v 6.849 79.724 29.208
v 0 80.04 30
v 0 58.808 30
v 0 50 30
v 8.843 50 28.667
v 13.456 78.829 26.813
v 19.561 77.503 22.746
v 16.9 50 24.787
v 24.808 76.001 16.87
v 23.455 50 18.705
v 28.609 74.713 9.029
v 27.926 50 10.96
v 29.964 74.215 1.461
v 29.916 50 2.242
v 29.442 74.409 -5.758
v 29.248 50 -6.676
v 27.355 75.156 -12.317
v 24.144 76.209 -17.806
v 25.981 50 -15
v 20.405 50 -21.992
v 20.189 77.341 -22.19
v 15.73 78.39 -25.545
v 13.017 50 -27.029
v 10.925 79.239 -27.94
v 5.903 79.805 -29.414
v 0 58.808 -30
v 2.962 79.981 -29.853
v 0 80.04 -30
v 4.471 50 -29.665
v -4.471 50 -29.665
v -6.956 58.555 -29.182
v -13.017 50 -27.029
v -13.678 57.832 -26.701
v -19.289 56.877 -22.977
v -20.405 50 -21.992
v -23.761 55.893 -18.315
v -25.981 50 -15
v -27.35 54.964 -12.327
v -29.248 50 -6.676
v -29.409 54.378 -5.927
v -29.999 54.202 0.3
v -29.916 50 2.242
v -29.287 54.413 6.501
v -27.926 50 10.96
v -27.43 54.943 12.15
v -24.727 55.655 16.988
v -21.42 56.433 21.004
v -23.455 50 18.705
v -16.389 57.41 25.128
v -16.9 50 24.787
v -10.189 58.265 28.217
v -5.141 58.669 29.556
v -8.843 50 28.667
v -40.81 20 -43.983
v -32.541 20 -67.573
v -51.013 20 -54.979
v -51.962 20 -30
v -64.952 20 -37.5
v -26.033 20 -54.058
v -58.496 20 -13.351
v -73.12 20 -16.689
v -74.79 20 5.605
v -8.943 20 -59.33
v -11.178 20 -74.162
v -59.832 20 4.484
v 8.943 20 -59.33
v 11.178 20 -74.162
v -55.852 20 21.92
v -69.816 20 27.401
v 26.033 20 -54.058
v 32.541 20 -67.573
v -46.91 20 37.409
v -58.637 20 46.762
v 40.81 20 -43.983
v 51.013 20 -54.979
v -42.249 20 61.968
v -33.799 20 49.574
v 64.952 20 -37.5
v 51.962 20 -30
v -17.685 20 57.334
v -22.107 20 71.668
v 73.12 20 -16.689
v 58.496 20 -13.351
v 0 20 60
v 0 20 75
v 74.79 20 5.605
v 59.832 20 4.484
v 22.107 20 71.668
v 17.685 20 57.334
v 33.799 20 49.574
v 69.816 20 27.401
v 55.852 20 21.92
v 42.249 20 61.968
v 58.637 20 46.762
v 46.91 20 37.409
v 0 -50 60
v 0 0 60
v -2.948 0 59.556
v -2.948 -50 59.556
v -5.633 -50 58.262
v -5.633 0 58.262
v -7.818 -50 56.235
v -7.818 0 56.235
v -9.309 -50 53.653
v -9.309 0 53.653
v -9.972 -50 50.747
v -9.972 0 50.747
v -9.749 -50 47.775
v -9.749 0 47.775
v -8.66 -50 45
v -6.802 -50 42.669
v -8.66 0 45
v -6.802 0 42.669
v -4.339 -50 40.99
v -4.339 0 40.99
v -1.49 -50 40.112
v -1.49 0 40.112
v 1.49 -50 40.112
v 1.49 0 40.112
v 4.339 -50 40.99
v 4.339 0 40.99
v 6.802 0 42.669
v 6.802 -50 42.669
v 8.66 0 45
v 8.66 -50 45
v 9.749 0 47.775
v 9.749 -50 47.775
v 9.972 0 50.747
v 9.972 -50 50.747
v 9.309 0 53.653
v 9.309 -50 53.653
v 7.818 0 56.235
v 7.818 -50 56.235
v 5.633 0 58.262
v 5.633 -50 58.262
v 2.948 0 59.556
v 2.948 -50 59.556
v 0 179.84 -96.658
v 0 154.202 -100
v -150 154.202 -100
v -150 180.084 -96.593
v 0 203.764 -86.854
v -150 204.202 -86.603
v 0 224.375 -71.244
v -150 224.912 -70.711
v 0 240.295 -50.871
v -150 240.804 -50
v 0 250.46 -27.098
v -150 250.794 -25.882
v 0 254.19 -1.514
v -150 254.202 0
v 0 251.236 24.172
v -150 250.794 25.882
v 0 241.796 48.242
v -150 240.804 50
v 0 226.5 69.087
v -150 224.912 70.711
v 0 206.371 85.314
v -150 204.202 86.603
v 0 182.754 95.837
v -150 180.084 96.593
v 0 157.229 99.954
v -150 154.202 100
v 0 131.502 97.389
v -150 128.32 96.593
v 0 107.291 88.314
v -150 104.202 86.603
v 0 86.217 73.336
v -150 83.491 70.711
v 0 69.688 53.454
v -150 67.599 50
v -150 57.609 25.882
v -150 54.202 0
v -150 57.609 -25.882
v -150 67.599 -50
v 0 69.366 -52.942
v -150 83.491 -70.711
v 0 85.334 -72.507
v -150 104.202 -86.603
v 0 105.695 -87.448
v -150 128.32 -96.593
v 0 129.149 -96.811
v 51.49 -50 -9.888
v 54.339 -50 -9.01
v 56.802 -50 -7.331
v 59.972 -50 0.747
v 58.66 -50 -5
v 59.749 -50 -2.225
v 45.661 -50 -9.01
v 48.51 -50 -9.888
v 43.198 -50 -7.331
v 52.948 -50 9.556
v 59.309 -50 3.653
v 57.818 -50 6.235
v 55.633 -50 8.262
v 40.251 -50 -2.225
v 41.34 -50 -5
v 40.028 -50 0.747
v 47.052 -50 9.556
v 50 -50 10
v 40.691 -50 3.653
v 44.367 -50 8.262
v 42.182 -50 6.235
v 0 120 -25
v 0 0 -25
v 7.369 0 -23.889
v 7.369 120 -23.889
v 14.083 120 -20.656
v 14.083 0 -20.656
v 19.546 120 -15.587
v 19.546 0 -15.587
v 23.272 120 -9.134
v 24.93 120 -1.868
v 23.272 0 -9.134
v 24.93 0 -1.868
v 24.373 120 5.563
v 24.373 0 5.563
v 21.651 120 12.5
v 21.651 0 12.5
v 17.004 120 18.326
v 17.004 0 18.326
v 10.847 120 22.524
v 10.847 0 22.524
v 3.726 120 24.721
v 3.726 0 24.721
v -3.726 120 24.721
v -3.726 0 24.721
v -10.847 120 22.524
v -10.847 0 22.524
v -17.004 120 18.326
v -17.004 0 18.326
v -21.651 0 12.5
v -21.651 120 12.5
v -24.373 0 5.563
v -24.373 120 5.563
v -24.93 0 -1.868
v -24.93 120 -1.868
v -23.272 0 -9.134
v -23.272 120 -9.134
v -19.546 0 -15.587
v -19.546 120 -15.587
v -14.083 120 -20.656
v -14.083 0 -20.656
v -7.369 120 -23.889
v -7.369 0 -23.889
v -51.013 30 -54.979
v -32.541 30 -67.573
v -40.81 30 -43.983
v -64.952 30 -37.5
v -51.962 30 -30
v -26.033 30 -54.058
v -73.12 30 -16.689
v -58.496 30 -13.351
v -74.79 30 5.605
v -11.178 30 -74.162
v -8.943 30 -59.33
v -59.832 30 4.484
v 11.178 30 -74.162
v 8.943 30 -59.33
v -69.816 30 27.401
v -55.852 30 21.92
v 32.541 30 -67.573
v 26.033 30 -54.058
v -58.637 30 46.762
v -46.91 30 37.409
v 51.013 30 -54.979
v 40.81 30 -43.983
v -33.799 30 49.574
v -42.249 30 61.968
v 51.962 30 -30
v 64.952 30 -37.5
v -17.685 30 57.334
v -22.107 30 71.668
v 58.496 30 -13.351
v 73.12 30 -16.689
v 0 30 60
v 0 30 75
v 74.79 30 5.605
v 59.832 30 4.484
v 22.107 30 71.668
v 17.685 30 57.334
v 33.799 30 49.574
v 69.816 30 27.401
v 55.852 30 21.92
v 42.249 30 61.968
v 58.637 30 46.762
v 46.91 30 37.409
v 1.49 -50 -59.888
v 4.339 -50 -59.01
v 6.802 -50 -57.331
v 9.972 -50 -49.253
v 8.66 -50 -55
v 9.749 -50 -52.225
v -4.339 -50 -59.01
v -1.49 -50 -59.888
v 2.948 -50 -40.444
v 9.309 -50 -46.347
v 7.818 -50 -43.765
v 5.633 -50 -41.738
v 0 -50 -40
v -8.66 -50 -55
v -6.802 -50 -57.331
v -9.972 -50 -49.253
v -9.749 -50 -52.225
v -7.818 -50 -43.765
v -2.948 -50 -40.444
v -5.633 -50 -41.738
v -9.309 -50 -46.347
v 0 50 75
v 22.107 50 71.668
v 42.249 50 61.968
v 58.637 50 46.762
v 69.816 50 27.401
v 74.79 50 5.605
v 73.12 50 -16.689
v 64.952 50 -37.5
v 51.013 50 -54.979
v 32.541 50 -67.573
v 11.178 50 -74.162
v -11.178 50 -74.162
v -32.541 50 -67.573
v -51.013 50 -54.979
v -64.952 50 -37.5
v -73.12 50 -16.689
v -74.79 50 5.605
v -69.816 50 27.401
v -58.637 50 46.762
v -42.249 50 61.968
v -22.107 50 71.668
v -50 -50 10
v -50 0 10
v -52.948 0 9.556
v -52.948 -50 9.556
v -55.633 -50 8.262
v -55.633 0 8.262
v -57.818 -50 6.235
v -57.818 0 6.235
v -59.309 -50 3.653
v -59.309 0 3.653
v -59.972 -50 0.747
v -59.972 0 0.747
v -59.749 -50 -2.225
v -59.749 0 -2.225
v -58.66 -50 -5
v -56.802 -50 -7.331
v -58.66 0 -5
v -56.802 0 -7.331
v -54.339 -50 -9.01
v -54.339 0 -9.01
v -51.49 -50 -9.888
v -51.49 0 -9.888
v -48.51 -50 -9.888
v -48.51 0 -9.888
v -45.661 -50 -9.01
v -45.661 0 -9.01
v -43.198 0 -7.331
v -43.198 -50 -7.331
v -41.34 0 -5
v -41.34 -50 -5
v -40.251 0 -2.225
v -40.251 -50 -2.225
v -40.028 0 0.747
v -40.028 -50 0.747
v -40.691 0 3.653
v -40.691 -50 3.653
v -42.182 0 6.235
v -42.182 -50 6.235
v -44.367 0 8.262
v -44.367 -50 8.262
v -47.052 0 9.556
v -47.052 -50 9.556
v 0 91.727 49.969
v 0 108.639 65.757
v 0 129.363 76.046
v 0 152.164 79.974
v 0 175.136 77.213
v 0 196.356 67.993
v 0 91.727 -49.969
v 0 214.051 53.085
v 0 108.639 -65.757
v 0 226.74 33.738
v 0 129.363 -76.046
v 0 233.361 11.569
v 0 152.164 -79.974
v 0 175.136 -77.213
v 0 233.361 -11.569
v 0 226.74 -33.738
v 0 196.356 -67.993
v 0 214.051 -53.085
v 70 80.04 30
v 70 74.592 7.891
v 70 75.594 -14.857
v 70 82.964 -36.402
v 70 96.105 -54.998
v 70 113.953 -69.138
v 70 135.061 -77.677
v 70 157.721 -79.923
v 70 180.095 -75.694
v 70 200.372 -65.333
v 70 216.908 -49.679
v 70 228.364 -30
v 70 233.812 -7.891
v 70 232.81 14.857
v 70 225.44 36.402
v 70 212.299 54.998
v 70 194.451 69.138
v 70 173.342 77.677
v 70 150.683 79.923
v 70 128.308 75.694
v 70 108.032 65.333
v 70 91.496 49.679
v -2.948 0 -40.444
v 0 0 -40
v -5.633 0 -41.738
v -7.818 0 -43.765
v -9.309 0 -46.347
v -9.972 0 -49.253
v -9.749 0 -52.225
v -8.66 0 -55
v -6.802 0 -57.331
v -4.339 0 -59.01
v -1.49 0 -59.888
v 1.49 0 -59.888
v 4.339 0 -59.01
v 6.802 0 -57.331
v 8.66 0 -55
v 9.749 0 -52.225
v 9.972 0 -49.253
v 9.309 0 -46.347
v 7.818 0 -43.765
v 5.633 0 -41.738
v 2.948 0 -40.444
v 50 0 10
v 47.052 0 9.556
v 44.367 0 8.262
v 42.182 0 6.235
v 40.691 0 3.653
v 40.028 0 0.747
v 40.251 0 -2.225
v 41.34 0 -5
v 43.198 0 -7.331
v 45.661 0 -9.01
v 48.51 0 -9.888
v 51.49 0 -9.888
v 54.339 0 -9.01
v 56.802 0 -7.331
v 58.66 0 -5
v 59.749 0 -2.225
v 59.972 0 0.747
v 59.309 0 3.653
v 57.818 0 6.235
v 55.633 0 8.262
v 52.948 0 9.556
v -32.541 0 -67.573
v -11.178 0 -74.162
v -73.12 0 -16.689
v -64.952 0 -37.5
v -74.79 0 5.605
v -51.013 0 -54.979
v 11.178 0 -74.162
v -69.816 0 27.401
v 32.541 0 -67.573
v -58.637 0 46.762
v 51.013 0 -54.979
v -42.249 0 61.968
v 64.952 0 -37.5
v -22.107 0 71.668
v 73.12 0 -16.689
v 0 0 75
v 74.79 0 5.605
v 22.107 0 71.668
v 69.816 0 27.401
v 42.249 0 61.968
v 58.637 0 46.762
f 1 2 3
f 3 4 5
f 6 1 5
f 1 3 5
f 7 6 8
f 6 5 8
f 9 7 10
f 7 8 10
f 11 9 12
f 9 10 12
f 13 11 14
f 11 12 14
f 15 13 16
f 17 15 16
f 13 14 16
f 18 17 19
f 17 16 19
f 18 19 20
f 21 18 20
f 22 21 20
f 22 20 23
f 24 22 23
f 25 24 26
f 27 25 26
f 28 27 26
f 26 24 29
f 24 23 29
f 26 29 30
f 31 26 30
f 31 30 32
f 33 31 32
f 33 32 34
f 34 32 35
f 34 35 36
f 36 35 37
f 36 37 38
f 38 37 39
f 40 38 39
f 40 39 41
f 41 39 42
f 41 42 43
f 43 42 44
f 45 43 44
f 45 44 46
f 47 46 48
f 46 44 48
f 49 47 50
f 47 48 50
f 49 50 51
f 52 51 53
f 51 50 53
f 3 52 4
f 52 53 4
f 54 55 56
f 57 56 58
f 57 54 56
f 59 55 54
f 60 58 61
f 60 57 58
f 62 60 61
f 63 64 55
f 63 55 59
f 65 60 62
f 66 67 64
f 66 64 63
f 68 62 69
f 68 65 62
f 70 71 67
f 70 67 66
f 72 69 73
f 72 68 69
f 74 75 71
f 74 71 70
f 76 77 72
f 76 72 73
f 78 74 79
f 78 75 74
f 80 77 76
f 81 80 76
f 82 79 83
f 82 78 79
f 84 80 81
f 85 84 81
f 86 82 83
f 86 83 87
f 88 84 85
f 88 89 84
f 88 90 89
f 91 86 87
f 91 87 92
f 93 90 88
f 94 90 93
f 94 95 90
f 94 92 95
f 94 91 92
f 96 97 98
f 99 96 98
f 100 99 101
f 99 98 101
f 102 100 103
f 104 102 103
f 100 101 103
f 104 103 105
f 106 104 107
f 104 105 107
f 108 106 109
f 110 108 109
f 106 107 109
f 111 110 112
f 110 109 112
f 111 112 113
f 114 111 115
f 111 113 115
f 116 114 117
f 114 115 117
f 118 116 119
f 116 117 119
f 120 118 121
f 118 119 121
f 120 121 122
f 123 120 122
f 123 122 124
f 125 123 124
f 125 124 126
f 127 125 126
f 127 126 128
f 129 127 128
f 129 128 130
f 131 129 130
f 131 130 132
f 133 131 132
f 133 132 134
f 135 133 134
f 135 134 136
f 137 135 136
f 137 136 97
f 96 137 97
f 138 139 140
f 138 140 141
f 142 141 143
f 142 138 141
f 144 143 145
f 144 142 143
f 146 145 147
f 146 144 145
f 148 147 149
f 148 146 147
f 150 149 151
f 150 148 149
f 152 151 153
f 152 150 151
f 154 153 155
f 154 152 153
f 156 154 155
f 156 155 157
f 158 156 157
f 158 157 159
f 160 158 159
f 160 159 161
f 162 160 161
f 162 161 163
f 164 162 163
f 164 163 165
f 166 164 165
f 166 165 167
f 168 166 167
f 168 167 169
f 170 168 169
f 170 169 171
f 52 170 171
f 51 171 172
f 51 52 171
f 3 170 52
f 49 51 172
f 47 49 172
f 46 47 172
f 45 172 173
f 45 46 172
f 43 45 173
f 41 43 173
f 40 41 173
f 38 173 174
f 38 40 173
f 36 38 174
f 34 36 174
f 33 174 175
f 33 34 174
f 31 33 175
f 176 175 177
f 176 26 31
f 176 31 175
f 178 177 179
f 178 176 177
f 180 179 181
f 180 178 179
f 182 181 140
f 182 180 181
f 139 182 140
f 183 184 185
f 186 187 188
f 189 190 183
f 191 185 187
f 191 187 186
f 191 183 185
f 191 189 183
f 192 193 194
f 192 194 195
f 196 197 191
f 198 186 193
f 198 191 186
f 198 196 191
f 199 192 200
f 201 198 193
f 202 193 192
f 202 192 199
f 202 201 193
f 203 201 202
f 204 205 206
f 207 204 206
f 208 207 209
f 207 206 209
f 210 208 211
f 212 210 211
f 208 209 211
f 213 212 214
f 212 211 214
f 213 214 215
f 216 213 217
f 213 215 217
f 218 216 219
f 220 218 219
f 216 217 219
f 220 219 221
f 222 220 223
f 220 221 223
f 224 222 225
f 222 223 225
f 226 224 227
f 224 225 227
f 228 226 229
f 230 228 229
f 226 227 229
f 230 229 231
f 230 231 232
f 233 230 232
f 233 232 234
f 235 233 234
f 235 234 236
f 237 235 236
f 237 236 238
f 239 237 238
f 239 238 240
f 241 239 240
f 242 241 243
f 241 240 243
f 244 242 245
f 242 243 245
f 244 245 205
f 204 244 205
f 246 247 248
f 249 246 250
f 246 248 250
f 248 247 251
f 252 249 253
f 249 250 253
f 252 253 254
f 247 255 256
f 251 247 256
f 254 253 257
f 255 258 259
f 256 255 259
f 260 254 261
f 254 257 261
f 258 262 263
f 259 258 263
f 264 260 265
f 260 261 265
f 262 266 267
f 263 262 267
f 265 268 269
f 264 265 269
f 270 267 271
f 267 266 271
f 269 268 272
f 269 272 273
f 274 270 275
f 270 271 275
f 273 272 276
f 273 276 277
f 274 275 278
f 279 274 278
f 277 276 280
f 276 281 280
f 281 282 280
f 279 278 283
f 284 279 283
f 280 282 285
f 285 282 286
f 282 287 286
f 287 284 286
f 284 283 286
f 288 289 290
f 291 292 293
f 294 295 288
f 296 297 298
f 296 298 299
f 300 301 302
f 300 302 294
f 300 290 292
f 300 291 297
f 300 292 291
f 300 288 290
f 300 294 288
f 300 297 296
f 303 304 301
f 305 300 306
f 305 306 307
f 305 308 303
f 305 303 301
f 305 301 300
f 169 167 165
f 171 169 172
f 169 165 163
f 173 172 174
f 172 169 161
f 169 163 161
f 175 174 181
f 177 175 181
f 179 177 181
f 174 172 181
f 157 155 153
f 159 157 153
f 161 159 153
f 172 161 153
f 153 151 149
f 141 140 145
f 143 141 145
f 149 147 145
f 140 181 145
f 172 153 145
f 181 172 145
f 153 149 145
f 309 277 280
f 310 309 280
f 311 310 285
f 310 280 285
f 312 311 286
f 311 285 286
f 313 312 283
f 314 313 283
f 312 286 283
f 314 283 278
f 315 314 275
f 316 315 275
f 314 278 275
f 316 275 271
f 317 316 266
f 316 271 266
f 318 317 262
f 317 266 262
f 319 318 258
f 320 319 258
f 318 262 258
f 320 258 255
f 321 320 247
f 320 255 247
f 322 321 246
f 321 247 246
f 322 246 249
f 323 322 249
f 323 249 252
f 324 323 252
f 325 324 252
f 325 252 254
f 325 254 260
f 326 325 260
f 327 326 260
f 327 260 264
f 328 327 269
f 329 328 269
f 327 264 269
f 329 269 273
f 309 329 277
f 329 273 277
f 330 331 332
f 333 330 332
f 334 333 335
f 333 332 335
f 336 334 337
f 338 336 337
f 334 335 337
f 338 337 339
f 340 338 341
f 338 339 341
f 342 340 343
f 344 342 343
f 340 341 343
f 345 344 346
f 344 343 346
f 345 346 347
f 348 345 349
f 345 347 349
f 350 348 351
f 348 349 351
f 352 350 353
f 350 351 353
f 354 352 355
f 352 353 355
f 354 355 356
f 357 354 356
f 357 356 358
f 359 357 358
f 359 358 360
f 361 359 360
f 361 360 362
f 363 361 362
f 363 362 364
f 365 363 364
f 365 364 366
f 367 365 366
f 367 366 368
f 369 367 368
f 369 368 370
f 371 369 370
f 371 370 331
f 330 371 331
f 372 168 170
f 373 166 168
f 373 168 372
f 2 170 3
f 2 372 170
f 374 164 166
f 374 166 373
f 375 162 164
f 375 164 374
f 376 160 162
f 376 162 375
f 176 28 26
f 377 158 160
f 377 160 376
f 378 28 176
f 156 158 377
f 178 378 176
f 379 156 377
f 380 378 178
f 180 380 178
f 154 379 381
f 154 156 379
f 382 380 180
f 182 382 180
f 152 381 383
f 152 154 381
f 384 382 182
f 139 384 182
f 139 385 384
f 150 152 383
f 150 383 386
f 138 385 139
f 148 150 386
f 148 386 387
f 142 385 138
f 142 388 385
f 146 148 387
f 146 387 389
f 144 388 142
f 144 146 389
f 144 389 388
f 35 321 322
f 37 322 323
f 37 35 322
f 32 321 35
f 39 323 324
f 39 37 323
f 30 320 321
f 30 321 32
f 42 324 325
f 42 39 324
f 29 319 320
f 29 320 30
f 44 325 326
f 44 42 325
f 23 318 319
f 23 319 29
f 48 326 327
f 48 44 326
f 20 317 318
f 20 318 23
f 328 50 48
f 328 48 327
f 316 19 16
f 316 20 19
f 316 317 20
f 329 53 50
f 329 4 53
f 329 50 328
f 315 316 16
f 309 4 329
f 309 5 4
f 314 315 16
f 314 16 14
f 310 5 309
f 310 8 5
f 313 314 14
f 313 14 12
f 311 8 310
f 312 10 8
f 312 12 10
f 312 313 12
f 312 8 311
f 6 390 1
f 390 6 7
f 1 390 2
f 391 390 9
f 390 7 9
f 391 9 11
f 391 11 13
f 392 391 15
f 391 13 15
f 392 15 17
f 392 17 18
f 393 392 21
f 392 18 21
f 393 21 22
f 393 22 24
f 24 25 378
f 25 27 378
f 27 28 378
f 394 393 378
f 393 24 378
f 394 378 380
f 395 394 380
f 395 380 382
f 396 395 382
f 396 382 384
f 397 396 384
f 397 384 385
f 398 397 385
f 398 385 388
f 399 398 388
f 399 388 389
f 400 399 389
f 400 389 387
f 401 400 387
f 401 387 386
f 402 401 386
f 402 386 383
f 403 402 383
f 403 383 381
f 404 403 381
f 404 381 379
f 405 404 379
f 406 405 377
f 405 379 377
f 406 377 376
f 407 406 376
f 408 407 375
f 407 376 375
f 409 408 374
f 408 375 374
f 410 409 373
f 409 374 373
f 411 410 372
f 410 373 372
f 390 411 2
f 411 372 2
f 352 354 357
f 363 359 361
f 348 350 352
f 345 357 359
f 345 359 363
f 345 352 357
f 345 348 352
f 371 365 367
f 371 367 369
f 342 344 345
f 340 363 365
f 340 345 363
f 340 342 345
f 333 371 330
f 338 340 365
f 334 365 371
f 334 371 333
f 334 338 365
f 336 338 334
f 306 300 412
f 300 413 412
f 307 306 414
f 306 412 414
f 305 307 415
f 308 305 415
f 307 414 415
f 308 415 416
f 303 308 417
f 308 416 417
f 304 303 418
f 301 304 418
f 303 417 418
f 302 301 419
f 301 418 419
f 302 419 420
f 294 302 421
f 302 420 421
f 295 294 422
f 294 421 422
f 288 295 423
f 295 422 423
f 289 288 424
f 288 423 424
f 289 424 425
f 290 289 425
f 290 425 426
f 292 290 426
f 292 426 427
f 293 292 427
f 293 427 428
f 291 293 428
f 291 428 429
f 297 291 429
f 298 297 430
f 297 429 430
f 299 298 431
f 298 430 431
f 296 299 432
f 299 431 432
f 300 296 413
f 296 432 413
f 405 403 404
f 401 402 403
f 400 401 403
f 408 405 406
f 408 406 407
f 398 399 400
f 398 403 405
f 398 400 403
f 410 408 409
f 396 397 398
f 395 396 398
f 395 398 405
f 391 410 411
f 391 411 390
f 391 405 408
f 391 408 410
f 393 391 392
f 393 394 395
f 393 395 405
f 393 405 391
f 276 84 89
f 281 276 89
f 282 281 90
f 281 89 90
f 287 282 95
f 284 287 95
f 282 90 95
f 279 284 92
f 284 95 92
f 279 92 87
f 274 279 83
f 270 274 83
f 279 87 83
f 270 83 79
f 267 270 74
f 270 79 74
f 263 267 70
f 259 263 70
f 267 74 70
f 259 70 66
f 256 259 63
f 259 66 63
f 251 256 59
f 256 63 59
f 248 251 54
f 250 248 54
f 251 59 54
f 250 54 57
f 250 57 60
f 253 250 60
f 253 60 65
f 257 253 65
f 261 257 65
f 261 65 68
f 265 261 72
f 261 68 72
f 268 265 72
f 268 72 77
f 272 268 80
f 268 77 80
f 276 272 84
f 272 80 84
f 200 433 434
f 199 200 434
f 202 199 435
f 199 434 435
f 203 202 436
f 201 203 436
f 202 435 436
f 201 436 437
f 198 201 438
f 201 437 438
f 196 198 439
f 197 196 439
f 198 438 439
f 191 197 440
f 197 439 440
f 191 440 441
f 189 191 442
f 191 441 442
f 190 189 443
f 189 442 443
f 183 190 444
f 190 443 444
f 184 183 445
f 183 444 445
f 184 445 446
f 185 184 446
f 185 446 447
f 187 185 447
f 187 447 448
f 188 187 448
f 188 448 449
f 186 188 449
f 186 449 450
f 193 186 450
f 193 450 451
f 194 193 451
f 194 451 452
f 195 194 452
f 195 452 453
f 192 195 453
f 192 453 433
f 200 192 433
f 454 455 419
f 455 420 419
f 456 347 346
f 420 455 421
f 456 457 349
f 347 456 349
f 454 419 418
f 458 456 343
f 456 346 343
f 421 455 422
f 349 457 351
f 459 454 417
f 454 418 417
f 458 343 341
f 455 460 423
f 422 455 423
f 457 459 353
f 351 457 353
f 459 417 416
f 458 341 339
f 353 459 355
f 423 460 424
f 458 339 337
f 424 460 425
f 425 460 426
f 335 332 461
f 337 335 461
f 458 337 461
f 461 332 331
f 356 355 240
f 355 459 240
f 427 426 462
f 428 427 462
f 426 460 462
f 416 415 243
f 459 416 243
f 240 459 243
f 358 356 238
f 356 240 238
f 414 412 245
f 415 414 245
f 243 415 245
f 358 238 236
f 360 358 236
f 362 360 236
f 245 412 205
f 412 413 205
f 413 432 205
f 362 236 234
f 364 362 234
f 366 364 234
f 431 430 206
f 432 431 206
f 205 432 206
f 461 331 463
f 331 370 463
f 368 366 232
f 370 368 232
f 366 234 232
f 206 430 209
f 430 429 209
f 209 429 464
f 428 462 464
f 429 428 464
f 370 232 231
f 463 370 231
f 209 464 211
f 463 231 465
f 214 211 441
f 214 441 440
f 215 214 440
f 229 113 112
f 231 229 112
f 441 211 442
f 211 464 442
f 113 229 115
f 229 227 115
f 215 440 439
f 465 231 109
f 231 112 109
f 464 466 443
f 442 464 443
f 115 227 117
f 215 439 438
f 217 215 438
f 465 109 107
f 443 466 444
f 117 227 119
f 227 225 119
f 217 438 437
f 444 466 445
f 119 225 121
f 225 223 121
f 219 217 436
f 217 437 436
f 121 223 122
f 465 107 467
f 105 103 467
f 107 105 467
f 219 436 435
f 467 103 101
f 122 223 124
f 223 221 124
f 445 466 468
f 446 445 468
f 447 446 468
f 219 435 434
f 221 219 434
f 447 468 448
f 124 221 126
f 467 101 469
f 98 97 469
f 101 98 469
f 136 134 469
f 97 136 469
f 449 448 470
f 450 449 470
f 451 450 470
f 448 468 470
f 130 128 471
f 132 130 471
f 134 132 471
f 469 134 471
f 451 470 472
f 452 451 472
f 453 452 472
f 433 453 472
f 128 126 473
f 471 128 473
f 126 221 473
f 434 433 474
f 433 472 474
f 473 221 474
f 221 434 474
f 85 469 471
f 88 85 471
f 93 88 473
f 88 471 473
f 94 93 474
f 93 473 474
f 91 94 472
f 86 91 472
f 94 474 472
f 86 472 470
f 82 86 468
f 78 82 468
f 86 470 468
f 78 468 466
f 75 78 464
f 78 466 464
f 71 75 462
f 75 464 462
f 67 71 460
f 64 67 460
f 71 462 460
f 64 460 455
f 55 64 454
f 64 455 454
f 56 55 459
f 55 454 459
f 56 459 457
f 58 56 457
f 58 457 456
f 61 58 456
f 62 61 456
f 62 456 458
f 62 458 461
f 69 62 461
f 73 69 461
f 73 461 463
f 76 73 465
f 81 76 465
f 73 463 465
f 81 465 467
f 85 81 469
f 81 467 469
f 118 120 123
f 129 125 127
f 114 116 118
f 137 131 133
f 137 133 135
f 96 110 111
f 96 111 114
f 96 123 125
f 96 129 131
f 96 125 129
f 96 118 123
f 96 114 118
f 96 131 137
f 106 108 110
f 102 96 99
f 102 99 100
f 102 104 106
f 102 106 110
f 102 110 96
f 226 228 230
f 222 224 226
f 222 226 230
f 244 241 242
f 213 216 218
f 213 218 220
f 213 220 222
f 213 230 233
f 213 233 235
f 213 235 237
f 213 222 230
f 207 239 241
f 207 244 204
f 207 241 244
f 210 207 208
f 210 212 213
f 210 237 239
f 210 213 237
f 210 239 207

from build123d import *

# Parameters (mm, degrees)
SKETCH1_R           = 75
BOSS_EXTRUDE1_DEPTH = 20
SKETCH2_R           = 60
BOSS_EXTRUDE2_DEPTH = 10
SKETCH3_R           = 75
BOSS_EXTRUDE3_DEPTH = 20
SKETCH4_R           = 30
BOSS_EXTRUDE4_DEPTH = 100
SKETCH5_R           = 100
BOSS_EXTRUDE5_DEPTH = 150
SKETCH6_R           = 80
BOSS_EXTRUDE6_DEPTH = 70
SKETCH7_R           = 10
BOSS_EXTRUDE7_DEPTH = 40
SKETCH13_R          = 25
CUT_EXTRUDE1_DEPTH  = 120
SKETCH14_R          = 10
BOSS_EXTRUDE8_DEPTH = 10


with BuildPart() as part:
    # Sketch1 → Boss-Extrude1 (new body)
    with BuildSketch(Plane(origin=(0, 0, 0), x_dir=(1, 0, 0), z_dir=(0, 1, 0))):
        with Locations(Location((0, 0, 0), (0, 0, 270))):
            Circle(SKETCH1_R)
    extrude(amount=BOSS_EXTRUDE1_DEPTH)

    # Sketch2 → Boss-Extrude2 (add)
    with BuildSketch(Plane(origin=(0, 20, 0), x_dir=(1, 0, 0), z_dir=(0, 1, 0))):
        with Locations(Location((0, 0, 0), (0, 0, 270))):
            Circle(SKETCH2_R)
    extrude(amount=BOSS_EXTRUDE2_DEPTH)

    # Sketch3 → Boss-Extrude3 (add)
    with BuildSketch(Plane(origin=(0, 30, 0), x_dir=(1, 0, 0), z_dir=(0, 1, 0))):
        with Locations(Location((0, 0, 0), (0, 0, 270))):
            Circle(SKETCH3_R)
    extrude(amount=BOSS_EXTRUDE3_DEPTH)

    # Sketch4 → Boss-Extrude4 (add)
    with BuildSketch(Plane(origin=(0, 50, 0), x_dir=(1, 0, 0), z_dir=(0, 1, 0))):
        with Locations(Location((0, 0, 0), (0, 0, 270))):
            Circle(SKETCH4_R)
    extrude(amount=BOSS_EXTRUDE4_DEPTH)

    # Sketch5 → Boss-Extrude5 (add)
    with BuildSketch(Plane(origin=(0, 0, 0), x_dir=(0, 0, -1), z_dir=(1, 0, 0))):
        with Locations((0, 154.201763101)):
            Circle(SKETCH5_R)
    extrude(amount=-BOSS_EXTRUDE5_DEPTH)

    # Sketch6 → Boss-Extrude6 (add)
    with BuildSketch(Plane(origin=(0, 0, 0), x_dir=(0, 0, -1), z_dir=(1, 0, 0))):
        with Locations(Location((0, 154.201763101, 0), (0, 0, 247.975687163))):
            Circle(SKETCH6_R)
    extrude(amount=BOSS_EXTRUDE6_DEPTH)

    # Sketch7 → Boss-Extrude7 (add)
    with BuildSketch(Plane(origin=(0, 0, 0), x_dir=(-1, 0, 0), z_dir=(0, -1, 0))):
        with Locations(Location((0, 50, 0), (0, 0, 270))):
            Circle(SKETCH7_R)
        with Locations(Location((-50, 0, 0), (0, 0, 270))):
            Circle(SKETCH7_R)
        with Locations(Location((0, -50, 0), (0, 0, 270))):
            Circle(SKETCH7_R)
        with Locations(Location((50, 0, 0), (0, 0, 270))):
            Circle(SKETCH7_R)
    extrude(amount=BOSS_EXTRUDE7_DEPTH)

    # Sketch13 → Cut-Extrude1 (cut)
    with BuildSketch(Plane(origin=(0, 0, 0), x_dir=(-1, 0, 0), z_dir=(0, -1, 0))):
        with Locations(Location((0, 0, 0), (0, 0, 90))):
            Circle(SKETCH13_R)
    extrude(amount=-CUT_EXTRUDE1_DEPTH, mode=Mode.SUBTRACT)

    # Sketch14 → Boss-Extrude8 (add)
    with BuildSketch(Plane(origin=(0, -40, 0), x_dir=(-1, 0, 0), z_dir=(0, -1, 0))):
        with Locations(Location((0, 50, 0), (0, 0, 270))):
            Circle(SKETCH14_R)
        with Locations(Location((50, 0, 0), (0, 0, 270))):
            Circle(SKETCH14_R)
        with Locations(Location((0, -50, 0), (0, 0, 270))):
            Circle(SKETCH14_R)
        with Locations(Location((-50, 0, 0), (0, 0, 270))):
            Circle(SKETCH14_R)
    extrude(amount=BOSS_EXTRUDE8_DEPTH)


solid = part.part
